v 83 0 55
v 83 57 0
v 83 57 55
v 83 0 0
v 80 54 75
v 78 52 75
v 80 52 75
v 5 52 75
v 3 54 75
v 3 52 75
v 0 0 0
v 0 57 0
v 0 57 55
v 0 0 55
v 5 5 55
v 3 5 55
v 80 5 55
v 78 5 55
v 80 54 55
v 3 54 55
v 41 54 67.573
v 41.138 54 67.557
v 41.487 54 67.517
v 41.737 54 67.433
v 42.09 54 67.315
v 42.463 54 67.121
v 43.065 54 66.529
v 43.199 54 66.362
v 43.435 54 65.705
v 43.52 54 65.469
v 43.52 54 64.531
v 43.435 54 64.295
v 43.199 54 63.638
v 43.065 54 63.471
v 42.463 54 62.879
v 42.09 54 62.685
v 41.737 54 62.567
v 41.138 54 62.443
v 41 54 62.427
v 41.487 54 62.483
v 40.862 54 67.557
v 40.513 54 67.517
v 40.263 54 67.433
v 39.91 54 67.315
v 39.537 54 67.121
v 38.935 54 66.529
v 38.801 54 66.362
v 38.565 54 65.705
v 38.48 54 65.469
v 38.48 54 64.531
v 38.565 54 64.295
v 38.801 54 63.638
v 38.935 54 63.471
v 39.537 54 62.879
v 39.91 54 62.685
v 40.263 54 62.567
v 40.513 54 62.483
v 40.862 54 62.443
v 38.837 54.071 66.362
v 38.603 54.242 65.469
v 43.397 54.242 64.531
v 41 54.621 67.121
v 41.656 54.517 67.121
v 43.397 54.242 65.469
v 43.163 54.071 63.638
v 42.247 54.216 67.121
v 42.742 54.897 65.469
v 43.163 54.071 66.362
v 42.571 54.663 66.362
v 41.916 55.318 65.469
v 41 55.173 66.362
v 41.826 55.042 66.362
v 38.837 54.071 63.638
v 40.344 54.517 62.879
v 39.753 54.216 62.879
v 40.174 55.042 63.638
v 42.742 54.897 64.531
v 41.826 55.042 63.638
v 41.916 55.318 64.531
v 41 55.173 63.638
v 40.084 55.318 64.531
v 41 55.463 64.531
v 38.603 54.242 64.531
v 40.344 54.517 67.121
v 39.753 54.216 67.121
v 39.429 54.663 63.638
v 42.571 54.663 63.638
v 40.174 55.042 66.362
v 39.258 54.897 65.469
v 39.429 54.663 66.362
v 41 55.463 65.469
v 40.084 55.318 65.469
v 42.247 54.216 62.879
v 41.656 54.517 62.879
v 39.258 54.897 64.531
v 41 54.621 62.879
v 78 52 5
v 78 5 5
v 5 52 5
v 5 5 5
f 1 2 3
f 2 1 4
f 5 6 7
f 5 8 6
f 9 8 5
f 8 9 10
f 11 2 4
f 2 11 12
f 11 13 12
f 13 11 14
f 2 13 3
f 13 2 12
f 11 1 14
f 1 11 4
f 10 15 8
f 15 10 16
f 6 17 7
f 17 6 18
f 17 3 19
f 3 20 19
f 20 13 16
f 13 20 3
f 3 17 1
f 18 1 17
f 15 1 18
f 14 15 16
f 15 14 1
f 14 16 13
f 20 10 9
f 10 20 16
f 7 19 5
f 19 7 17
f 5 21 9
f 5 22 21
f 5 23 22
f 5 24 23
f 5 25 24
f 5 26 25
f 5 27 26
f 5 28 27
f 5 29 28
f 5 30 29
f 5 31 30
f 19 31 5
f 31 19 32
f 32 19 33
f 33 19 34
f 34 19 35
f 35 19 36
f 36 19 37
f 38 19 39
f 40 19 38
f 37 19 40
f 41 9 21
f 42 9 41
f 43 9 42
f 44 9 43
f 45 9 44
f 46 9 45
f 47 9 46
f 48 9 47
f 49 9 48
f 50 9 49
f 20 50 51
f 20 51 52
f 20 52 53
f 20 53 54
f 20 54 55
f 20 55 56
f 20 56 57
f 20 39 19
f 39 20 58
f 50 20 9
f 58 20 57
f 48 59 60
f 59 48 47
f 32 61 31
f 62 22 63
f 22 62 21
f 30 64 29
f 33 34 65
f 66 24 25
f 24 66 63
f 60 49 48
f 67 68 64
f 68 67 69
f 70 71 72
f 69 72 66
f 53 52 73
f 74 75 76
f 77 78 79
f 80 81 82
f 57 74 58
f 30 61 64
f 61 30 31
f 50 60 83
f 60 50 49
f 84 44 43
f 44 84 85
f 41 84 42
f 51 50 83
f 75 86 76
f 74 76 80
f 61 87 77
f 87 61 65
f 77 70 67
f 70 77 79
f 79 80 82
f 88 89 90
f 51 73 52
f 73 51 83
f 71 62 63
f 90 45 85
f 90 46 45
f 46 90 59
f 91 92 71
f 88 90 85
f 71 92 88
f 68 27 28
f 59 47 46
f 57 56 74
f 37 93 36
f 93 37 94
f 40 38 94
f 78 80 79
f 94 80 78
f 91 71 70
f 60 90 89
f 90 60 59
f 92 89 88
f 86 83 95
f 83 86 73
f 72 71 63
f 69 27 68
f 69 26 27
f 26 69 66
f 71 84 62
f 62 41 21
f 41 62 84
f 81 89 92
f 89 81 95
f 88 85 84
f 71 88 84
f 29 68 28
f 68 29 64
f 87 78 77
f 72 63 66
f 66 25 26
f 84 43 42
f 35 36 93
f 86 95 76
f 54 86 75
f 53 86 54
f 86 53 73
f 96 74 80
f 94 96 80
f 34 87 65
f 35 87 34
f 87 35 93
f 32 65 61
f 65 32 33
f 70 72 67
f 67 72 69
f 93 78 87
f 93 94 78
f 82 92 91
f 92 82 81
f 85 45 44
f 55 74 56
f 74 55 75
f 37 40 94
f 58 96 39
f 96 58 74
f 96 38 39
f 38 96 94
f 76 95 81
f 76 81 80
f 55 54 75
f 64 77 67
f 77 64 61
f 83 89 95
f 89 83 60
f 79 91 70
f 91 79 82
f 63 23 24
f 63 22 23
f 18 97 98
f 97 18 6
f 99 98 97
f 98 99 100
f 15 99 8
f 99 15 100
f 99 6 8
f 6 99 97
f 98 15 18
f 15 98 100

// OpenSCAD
union() {
	difference() {
		union() {
			difference() {
				difference() {
					difference() {
						difference() {
							cube(size = [83, 57, 75]);
							translate(v = [-1, 0, 55]) {
								rotate(a = 90, v = [0, 0, 1]) {
									rotate(a = 90, v = [1, 0, 0]) {
										linear_extrude(height = 85) {
											polygon(paths = [[0, 1, 2, 3, 4]], points = [[-1, 0], [5, 0], [52, 20], [52, 100], [-1, 100]]);
										}
									}
								}
							}
						}
						translate(v = [-1, -1, 55]) {
							cube(size = [4, 472, 100]);
						}
					}
					translate(v = [80, -1, 55]) {
						cube(size = [4, 472, 100]);
					}
				}
				translate(v = [-1, 54, 55]) {
					cube(size = [85, 4, 100]);
				}
			}
			translate(v = [41, 52.5000000000, 65.0000000000]) {
				sphere($fn = 20, r = 3);
			}
		}
		translate(v = [5, 5, 5]) {
			cube(size = [73, 47, 100]);
		}
	}
}
